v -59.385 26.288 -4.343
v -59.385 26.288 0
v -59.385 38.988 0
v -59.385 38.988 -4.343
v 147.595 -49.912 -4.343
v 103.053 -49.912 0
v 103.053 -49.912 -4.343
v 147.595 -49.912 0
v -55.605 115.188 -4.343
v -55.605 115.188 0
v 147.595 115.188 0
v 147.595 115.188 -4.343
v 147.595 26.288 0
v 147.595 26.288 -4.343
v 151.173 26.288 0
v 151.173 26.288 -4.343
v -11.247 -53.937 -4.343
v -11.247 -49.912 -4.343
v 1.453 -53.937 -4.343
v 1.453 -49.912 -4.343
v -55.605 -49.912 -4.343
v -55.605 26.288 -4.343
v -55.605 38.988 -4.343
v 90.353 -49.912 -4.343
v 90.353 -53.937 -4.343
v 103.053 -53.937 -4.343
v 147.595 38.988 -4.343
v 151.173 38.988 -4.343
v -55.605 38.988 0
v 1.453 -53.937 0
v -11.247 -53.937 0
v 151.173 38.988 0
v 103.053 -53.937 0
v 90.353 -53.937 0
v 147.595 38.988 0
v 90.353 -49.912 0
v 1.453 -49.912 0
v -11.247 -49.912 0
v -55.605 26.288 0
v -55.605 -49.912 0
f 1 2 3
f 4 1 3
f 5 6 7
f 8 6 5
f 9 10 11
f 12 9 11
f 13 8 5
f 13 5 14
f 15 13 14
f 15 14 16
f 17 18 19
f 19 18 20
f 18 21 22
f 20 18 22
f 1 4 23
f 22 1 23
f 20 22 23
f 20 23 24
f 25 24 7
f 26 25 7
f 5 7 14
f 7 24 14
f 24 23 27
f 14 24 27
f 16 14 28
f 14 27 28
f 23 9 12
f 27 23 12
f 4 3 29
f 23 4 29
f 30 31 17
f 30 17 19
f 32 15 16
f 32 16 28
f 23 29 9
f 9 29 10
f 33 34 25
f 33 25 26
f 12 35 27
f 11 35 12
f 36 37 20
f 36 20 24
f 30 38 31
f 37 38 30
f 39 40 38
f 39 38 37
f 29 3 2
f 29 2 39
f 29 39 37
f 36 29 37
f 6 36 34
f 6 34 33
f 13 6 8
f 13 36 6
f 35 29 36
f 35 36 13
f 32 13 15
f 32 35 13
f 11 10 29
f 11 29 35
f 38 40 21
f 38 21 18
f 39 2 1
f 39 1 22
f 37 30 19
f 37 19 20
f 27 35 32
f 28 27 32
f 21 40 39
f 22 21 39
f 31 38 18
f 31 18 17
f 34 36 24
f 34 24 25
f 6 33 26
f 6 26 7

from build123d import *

# Parameters (mm, degrees)
F0_W     = 203.2
F0_H     = 165.1
F1_DEPTH = 4.3434
F3_DEPTH = 4.3434
F4_W     = 4.3434
F4_H     = 12.7
F5_DEPTH = 4.3434


with BuildPart() as f1:
    # F0 (on Top) → F1 (new body)
    with BuildSketch(Plane.XY):
        with Locations((45.995247, 32.638061)):
            Rectangle(F0_W, F0_H)
    extrude(amount=-F1_DEPTH)

    # F2 (on Top) → F3 (join)
    with BuildSketch(Plane.XY):
        Polygon((-4.896646, -49.593655), (-11.246646, -49.593655), (-11.246646, -53.937055), (-4.896646, -53.937055), (1.453354, -53.937055), (1.453354, -49.593655), align=None)
        Polygon((103.053354, -53.937055), (103.053354, -49.593655), (96.703354, -49.593655), (90.353354, -49.593655), (90.353354, -53.937055), (96.703354, -53.937055), align=None)
    extrude(amount=-F3_DEPTH)

    # F4 (on Top) → F5 (join)
    with BuildSketch(Plane.XY):
        with Locations((-57.213607, 32.638061)):
            Rectangle(F4_W, F4_H)
        with Locations((149.000803, 32.638061)):
            Rectangle(F4_W, F4_H)
    extrude(amount=-F5_DEPTH)


solid = f1.part
